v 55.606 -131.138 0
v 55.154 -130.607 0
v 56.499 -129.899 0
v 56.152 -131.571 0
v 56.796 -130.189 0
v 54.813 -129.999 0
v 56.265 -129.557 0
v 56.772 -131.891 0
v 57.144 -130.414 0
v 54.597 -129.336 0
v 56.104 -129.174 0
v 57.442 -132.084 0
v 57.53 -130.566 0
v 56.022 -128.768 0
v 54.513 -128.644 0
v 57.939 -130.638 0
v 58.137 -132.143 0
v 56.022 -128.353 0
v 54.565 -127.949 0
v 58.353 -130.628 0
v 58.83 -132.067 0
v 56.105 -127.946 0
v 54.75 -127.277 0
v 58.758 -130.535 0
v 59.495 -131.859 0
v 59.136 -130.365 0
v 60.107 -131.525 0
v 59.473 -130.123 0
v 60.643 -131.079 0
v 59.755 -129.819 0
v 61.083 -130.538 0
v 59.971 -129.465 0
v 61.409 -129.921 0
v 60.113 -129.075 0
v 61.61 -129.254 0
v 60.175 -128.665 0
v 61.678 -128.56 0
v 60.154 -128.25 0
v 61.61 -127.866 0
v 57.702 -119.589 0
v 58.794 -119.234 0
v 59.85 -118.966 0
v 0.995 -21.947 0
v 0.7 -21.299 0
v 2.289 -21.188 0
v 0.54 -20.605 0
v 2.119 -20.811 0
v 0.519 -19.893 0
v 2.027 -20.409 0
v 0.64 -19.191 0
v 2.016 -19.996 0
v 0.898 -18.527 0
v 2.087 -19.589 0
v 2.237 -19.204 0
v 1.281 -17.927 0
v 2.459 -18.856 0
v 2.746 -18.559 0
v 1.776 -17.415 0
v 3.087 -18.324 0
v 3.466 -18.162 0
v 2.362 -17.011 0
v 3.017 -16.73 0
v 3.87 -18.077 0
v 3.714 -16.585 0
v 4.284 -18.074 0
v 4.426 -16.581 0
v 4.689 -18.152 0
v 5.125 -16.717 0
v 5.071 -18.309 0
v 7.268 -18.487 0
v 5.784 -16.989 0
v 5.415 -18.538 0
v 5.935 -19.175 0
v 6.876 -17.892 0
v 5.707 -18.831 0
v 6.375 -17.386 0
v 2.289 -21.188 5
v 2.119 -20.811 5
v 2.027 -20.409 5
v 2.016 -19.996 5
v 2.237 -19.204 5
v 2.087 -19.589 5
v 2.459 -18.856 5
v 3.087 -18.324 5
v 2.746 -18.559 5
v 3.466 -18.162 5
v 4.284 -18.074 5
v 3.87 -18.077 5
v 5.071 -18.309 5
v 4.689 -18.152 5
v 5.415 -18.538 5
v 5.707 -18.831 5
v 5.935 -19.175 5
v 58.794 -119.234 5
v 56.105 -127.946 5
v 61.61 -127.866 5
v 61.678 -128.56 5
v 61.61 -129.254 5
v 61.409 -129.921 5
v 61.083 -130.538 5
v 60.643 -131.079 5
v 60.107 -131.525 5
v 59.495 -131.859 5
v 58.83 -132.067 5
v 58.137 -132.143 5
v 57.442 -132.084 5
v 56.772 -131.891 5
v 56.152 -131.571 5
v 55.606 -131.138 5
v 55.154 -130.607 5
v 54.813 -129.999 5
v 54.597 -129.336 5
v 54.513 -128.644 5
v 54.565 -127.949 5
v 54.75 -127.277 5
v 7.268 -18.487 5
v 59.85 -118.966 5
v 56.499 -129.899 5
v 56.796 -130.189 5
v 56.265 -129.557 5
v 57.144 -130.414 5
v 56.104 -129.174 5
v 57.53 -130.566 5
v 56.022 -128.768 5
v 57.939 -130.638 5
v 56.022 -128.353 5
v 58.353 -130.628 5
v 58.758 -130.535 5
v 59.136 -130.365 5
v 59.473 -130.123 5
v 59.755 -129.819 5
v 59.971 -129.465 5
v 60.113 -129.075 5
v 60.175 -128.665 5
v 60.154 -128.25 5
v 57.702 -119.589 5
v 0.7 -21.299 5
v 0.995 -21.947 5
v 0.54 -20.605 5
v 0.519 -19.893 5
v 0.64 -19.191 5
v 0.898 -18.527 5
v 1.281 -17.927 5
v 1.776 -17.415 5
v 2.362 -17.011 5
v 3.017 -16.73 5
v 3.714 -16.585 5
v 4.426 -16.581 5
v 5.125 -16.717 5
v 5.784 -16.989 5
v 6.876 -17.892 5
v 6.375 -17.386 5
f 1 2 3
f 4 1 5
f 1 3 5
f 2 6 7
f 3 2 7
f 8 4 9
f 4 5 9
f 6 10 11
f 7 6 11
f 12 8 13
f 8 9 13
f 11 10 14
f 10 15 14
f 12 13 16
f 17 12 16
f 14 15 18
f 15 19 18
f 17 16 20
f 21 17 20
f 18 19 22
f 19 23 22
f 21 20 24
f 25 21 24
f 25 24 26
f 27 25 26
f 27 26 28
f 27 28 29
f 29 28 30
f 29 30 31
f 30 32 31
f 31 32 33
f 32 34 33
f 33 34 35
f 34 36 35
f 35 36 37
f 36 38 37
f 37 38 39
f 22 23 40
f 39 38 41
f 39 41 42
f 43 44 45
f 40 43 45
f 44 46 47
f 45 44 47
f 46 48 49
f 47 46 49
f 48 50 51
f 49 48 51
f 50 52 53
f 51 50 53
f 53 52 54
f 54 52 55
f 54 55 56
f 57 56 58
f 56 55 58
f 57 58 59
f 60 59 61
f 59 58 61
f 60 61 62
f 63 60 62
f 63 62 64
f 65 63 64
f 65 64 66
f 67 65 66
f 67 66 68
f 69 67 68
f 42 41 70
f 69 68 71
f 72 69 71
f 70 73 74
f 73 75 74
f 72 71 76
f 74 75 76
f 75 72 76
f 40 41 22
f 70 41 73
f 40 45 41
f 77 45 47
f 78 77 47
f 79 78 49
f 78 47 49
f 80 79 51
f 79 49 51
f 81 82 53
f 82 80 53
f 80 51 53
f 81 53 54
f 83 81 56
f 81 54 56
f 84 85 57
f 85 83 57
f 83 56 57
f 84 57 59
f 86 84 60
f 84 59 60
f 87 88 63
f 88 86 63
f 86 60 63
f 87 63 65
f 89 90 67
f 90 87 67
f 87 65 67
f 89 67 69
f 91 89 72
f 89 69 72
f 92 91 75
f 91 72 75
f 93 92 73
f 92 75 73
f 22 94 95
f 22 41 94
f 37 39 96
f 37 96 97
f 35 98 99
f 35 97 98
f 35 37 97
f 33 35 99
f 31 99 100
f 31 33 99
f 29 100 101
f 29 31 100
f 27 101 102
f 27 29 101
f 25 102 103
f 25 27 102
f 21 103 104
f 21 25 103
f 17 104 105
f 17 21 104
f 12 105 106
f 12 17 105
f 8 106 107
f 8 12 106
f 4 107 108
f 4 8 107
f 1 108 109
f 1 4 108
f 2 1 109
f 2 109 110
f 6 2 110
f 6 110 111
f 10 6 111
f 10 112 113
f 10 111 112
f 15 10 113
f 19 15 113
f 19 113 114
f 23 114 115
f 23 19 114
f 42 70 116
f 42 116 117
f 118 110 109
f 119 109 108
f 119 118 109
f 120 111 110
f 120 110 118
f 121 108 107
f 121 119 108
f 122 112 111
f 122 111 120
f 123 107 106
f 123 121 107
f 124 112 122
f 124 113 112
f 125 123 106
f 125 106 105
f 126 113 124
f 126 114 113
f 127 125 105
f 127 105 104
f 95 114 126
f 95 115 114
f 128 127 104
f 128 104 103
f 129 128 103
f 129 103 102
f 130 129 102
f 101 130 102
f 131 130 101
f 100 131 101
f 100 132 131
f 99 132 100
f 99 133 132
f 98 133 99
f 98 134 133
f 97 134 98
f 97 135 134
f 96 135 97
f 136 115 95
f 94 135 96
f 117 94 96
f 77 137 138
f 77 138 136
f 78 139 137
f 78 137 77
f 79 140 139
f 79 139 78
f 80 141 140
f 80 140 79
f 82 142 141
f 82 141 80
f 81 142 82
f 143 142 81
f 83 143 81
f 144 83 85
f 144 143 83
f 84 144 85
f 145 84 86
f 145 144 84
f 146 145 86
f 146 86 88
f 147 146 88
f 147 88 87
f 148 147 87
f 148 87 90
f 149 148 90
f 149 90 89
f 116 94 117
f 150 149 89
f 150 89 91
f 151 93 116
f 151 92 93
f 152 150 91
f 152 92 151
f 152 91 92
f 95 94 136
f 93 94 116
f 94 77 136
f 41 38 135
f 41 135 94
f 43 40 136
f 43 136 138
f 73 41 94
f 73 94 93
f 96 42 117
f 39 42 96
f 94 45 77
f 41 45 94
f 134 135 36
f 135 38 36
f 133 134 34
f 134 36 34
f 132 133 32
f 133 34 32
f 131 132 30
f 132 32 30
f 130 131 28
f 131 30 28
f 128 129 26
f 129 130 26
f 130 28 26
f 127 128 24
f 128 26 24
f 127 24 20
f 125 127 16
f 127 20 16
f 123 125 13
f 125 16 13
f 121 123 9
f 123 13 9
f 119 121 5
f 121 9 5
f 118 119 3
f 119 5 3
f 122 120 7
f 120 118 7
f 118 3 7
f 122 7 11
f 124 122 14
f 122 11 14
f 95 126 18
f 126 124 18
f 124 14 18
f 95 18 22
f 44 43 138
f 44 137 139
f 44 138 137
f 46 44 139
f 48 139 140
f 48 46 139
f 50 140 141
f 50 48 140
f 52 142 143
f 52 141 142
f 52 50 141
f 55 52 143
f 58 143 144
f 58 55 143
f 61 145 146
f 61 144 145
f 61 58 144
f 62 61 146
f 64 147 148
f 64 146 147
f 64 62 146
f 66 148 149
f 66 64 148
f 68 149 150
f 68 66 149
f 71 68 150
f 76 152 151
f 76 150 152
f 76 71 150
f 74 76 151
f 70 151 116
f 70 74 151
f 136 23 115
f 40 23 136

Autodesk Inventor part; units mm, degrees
ref_plane "YZ Plane" through (0, 0, 0) normal (1, 0, 0) x (0, 1, 0)
ref_plane "XZ Plane" through (0, 0, 0) normal (0, 1, 0) x (-1, 0, 0)
ref_plane "XY Plane" through (0, 0, 0) normal (0, 0, 1) x (1, 0, 0)
sketch "Sketch2" plane through (0, 0, 0) normal (0, 0, 1) x (1, 0, 0)
  circle A0 centre (4.0931, -20.1479) radius 2.1844 construction
  line L0 (57.7016, -119.5892) -> (56.531, -118.5169) construction
  circle A1 centre (58.0948, -128.5608) radius 2.1844 construction
  arc A2 (56.1046, -127.9465) -> (60.1543, -128.2505) centre (58.0948, -128.5608) ccw
  arc A3 (5.9348, -19.175) -> (2.2886, -21.1879) centre (4.0931, -20.1479) ccw
  arc A4 (54.75, -127.2766) -> (61.6095, -127.8658) centre (58.0948, -128.5608) ccw
  arc A5 (7.2676, -18.4867) -> (0.9949, -21.9473) centre (4.0931, -20.1479) ccw
  line L1 (54.75, -127.2766) -> (57.7016, -119.5892)
  line L2 (57.7016, -119.5892) -> (0.9949, -21.9473)
  line L3 (2.2886, -21.1879) -> (58.7941, -119.2338)
  line L4 (58.7941, -119.2338) -> (56.1046, -127.9465)
  line L5 (60.1543, -128.2505) -> (58.7957, -119.2343)
  line L6 (58.7957, -119.2343) -> (5.9348, -19.175)
  line L7 (7.2676, -18.4867) -> (59.8498, -118.9661)
  line L8 (59.8498, -118.9661) -> (61.6095, -127.8658)
  point P0 (0, 0)
  dimension "d17" = 4.1656
  dimension "d18" = 4.1656
  dimension "d19" = 1.5
  dimension "d20" = 1.5
  dimension "d21" = 1
extrude "Extrusion2" add sketch "Sketch2" along normal blind 5
properties part number "Angle Changer left band"
